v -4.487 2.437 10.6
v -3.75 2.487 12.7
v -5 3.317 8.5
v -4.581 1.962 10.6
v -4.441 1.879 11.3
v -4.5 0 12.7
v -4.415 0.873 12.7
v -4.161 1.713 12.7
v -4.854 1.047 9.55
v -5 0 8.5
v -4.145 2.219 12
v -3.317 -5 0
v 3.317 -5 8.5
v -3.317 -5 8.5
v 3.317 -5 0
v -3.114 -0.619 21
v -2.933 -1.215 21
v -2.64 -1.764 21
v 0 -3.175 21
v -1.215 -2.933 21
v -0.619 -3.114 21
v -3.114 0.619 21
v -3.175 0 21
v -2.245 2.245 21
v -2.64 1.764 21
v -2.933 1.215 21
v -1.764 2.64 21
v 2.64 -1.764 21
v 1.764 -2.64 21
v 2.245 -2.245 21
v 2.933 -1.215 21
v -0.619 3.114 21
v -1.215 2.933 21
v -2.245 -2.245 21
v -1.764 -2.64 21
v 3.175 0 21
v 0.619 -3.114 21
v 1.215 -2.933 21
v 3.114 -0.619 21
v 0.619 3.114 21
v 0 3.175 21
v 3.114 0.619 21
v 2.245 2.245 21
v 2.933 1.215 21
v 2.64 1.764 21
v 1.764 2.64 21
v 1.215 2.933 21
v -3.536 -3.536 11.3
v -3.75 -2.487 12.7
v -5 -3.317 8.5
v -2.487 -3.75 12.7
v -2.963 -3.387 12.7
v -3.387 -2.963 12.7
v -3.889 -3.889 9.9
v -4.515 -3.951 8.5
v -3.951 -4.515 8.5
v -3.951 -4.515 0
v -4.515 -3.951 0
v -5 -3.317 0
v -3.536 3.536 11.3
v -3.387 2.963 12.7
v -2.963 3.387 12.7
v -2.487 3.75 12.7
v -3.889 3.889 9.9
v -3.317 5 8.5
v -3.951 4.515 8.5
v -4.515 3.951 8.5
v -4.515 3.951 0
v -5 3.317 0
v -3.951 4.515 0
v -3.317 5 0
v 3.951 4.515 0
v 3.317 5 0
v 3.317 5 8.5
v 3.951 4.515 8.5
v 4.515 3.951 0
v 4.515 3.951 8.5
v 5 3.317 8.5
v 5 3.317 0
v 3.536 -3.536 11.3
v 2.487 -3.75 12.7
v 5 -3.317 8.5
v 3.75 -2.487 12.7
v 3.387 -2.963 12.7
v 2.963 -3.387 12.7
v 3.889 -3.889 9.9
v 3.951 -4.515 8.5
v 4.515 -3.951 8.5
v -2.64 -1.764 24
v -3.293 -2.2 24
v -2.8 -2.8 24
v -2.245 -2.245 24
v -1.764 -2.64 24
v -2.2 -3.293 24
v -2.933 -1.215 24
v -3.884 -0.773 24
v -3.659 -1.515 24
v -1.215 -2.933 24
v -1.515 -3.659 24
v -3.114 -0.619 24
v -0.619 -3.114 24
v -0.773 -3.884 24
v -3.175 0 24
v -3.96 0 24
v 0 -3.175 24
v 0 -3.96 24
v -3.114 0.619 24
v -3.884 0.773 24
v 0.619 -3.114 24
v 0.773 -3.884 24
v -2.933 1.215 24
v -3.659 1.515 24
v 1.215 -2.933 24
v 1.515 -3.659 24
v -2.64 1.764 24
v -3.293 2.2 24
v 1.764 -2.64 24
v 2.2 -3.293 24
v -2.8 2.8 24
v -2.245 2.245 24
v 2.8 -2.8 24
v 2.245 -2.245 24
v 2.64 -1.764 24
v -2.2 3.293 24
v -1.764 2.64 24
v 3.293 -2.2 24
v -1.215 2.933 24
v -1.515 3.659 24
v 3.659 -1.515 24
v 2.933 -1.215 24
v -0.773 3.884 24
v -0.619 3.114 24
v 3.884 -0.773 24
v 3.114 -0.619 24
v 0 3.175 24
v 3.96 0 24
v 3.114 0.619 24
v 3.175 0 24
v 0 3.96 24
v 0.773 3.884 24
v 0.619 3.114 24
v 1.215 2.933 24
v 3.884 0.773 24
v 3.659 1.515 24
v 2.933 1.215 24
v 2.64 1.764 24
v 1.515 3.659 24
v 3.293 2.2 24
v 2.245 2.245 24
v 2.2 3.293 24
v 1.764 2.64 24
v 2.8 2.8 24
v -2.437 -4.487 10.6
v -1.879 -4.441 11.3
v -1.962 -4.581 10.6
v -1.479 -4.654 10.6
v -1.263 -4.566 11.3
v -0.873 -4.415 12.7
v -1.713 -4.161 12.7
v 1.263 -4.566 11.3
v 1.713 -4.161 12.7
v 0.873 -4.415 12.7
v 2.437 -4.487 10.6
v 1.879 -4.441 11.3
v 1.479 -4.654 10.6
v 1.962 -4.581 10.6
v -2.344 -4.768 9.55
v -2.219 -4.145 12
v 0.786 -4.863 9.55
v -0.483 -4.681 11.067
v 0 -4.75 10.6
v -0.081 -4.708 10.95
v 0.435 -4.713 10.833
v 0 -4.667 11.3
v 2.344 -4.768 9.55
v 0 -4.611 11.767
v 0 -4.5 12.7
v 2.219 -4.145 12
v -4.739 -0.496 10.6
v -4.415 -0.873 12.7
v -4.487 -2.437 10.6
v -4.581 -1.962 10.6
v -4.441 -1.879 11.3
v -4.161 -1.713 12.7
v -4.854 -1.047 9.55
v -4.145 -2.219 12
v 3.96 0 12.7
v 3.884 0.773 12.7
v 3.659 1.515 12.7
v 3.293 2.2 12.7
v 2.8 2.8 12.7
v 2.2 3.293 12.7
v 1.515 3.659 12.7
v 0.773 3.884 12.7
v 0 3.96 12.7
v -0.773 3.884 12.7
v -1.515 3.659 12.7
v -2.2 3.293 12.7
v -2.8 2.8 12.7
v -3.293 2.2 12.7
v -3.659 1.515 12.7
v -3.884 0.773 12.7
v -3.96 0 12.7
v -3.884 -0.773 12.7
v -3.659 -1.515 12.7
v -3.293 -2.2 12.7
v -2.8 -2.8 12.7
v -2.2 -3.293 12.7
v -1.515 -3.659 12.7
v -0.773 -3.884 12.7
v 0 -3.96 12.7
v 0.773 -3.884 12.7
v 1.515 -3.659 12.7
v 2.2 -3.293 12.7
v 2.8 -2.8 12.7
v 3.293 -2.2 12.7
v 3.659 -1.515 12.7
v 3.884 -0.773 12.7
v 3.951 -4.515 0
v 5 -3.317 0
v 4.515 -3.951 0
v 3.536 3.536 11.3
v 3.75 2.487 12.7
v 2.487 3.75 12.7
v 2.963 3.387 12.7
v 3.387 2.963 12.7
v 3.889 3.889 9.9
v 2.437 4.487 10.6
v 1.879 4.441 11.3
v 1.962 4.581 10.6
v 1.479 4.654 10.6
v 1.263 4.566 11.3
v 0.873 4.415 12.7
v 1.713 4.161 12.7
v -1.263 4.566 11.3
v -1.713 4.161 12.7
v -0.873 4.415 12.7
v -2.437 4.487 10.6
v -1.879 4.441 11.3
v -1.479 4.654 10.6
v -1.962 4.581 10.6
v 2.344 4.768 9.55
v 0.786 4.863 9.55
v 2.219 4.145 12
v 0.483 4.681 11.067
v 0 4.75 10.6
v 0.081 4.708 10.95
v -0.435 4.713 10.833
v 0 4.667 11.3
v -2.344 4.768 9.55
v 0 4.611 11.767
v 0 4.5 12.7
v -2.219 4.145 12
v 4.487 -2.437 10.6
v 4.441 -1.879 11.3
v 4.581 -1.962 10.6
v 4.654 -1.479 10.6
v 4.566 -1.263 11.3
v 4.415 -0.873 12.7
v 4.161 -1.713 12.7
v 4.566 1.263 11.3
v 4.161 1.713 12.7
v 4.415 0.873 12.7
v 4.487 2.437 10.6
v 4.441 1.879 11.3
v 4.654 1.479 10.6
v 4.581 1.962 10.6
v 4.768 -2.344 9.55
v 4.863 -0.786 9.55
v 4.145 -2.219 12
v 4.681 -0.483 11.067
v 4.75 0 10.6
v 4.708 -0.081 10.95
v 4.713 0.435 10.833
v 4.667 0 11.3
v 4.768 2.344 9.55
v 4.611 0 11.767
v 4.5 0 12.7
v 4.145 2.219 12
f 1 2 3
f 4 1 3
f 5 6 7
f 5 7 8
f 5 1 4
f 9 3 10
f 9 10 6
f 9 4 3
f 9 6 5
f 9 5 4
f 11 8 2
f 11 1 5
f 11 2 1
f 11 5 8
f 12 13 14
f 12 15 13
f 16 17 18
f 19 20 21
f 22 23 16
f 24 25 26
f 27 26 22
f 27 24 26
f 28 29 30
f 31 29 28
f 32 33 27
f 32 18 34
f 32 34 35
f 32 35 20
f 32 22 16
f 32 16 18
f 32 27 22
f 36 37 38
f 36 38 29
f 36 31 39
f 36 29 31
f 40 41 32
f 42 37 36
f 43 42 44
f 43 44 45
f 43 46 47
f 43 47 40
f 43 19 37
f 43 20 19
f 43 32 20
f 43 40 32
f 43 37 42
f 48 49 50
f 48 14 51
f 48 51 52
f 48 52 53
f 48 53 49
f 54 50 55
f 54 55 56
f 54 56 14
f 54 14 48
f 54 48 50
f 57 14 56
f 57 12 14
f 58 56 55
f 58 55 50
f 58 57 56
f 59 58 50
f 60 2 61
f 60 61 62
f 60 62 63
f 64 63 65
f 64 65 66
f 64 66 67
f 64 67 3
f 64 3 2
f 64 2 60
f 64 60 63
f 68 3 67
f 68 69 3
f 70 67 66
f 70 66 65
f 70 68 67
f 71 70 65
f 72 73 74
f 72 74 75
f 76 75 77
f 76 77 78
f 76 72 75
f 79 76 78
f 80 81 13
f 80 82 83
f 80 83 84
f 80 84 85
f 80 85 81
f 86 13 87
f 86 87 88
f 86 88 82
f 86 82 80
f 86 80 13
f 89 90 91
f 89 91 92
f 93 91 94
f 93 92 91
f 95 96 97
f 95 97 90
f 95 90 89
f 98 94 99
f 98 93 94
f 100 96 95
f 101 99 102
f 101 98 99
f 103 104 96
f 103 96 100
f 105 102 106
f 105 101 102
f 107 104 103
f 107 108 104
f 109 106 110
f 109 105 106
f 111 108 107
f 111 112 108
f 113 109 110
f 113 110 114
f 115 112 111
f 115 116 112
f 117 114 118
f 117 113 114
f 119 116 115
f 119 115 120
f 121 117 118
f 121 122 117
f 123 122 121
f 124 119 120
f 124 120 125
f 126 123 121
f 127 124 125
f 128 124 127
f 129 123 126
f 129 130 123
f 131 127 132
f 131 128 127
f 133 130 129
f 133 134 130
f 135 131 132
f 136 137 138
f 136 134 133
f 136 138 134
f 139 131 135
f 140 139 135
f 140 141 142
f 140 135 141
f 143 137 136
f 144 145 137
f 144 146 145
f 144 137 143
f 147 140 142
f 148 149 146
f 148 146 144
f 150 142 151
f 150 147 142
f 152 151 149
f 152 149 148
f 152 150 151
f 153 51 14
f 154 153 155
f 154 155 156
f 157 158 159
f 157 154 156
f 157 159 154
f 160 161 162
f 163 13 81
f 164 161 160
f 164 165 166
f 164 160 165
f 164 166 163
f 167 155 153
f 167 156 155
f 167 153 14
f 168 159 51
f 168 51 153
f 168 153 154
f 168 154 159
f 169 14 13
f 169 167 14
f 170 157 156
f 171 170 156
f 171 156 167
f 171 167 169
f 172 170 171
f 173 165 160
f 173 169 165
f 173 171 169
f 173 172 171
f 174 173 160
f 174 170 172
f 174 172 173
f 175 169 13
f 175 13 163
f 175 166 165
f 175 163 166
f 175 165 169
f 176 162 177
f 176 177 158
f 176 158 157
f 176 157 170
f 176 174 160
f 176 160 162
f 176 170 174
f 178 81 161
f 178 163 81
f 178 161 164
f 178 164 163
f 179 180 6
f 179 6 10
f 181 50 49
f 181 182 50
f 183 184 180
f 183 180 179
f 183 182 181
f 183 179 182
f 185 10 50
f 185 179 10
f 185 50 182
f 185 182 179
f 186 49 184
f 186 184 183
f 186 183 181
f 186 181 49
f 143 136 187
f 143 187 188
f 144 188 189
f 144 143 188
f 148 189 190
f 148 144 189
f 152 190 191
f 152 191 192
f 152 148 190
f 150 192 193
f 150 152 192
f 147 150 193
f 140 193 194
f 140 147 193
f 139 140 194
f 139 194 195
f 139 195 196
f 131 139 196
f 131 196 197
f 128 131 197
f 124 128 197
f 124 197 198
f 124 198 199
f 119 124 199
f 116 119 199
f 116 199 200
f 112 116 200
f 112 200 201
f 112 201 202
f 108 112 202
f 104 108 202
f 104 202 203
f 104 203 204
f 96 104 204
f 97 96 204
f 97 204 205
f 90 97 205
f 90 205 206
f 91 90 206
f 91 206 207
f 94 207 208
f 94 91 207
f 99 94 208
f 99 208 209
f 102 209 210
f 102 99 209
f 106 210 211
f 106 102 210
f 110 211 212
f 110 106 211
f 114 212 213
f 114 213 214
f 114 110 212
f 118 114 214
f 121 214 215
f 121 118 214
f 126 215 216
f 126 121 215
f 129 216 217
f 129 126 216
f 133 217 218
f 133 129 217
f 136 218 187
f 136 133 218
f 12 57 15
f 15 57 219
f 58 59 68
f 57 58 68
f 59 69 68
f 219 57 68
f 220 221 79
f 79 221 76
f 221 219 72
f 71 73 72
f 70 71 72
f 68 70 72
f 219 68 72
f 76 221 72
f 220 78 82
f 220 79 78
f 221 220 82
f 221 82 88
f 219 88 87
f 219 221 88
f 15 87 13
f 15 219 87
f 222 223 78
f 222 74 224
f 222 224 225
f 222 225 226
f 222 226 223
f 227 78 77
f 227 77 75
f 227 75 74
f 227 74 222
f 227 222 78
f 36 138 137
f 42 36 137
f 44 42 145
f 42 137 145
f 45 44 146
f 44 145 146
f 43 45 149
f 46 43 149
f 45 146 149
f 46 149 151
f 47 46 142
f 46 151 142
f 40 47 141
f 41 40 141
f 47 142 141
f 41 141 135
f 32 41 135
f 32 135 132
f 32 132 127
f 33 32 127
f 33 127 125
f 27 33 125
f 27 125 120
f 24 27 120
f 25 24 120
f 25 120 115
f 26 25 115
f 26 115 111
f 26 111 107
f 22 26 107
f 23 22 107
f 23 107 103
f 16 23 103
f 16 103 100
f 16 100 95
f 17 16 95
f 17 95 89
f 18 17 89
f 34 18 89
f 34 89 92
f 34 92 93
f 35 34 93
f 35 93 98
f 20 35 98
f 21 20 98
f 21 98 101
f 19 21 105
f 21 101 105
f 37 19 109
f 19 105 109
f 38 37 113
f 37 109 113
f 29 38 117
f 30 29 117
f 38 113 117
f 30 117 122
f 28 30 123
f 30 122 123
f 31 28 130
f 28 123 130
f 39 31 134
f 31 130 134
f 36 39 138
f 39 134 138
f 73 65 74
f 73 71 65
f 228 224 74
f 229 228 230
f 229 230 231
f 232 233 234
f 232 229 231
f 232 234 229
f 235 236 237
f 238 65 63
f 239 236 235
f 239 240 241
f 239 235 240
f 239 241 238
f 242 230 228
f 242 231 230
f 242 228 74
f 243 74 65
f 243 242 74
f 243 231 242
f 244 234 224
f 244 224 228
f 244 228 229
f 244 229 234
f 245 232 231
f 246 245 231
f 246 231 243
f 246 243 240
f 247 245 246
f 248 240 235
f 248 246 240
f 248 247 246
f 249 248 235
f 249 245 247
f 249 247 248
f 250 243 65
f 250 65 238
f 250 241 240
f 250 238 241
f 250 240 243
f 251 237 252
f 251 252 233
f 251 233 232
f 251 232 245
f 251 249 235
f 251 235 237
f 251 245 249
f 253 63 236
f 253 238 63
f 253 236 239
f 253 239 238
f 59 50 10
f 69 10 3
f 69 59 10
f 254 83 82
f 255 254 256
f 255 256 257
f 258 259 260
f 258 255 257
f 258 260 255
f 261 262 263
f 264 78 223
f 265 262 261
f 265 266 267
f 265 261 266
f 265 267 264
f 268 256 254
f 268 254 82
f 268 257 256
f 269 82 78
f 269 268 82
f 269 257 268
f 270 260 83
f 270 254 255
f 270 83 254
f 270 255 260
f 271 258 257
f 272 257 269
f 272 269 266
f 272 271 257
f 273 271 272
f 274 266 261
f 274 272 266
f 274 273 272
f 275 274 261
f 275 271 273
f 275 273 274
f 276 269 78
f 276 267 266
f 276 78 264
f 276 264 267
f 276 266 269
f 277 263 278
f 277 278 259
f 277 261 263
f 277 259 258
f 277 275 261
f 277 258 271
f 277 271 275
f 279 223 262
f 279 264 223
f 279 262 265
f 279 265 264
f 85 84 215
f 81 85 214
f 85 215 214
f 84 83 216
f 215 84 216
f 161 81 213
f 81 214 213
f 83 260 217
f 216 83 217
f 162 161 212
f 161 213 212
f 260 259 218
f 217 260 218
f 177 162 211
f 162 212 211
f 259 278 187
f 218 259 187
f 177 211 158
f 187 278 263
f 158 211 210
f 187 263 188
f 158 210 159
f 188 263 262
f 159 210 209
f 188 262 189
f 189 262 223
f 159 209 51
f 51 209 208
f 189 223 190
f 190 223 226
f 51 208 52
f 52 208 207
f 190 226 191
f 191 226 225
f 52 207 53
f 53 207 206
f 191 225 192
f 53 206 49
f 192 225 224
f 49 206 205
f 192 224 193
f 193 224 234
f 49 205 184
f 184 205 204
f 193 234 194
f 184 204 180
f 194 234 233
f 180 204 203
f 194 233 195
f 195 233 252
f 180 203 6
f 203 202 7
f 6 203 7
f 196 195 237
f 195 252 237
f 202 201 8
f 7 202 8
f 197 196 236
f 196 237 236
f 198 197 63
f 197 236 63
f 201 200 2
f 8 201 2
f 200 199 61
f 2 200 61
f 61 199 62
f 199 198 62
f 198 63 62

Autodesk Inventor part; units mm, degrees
ref_plane "YZ Plane" through (0, 0, 0) normal (1, 0, 0) x (0, 1, 0)
ref_plane "XZ Plane" through (0, 0, 0) normal (0, 1, 0) x (-1, 0, 0)
sketch "Sketch1" plane through (0, 0, 0) normal (0, 0, 1) x (1, 0, 0)
  circle A0 centre (0, 0) radius 6
  dimension "d0" = 12
extrude "Extrusion1" add sketch "Sketch1" along normal blind 24
sketch "Sketch2" plane through (0, 0, 0) normal (0, 0, -1) x (-1, 0, 0)
  line L0 (-5, -5) -> (5, -5)
  line L1 (5, -5) -> (5, 5)
  line L2 (5, 5) -> (-5, 5)
  line L3 (-5, 5) -> (-5, -5)
  line L4 (-5, -5) -> (5, 5) construction
  line L5 (5, -5) -> (-5, 5) construction
  circle A0 centre (0, 0) radius 7.723
  dimension "d3" = 10
  dimension "d4" = 10
extrude "Extrusion2" cut sketch "Sketch2" against normal blind 8.5
sketch "Sketch3" plane through (0, 0, 24) normal (0, 0, 1) x (1, 0, 0)
  circle A0 centre (0, 0) radius 3.175
  dimension "d7" = 6.35
extrude "Extrusion3" cut sketch "Sketch3" against normal blind 3
ref_plane "Work Plane1" through (0, 0, 12.7) normal (0, 0, -1) x (-1, 0, 0)
sketch "Sketch5" plane through (0, 0, 24) normal (0, 0, 1) x (1, 0, 0)
  circle A0 centre (0, 0) radius 3.96
  circle A1 centre (0, 0) radius 11.6408
  dimension "d14" = 7.92
extrude "Extrusion4" cut sketch "Sketch5" against normal up to surface (15.5 mm away)
sketch "Sketch6" plane through (-3.3166, 5, 8.5) normal (0, 0, 1) x (1, 0, 0)
  line L0 (8.3166, -1.6834) -> (8.3166, -8.3166) projected
  arc A0 (8.3166, -1.6834) -> (6.6332, 0) centre (3.3166, -5) ccw projected
  line L1 (0, 0) -> (6.6332, 0) projected
  arc A1 (0, 0) -> (-1.6834, -1.6834) centre (3.3166, -5) ccw projected
  line L2 (-1.6834, -8.3166) -> (-1.6834, -1.6834) projected
  arc A2 (-1.6834, -8.3166) -> (0, -10) centre (3.3166, -5) ccw projected
  line L3 (6.6332, -10) -> (0, -10) projected
  arc A3 (6.6332, -10) -> (8.3166, -8.3166) centre (3.3166, -5) ccw projected
  circle A4 centre (3.3166, -5) radius 3.96 construction
sketch "Sketch7" plane through (0, 0, 12.7) normal (0, 0, -1) x (-1, 0, 0)
  circle A0 centre (0, 0) radius 3.96 construction
  circle A1 centre (0, 0) radius 3.175 construction
  circle A2 centre (0, 0) radius 4.5
  dimension "d18" = 9
loft "Loft1" add profiles "Sketch6", "Sketch7"
properties part number "J0_Post"
